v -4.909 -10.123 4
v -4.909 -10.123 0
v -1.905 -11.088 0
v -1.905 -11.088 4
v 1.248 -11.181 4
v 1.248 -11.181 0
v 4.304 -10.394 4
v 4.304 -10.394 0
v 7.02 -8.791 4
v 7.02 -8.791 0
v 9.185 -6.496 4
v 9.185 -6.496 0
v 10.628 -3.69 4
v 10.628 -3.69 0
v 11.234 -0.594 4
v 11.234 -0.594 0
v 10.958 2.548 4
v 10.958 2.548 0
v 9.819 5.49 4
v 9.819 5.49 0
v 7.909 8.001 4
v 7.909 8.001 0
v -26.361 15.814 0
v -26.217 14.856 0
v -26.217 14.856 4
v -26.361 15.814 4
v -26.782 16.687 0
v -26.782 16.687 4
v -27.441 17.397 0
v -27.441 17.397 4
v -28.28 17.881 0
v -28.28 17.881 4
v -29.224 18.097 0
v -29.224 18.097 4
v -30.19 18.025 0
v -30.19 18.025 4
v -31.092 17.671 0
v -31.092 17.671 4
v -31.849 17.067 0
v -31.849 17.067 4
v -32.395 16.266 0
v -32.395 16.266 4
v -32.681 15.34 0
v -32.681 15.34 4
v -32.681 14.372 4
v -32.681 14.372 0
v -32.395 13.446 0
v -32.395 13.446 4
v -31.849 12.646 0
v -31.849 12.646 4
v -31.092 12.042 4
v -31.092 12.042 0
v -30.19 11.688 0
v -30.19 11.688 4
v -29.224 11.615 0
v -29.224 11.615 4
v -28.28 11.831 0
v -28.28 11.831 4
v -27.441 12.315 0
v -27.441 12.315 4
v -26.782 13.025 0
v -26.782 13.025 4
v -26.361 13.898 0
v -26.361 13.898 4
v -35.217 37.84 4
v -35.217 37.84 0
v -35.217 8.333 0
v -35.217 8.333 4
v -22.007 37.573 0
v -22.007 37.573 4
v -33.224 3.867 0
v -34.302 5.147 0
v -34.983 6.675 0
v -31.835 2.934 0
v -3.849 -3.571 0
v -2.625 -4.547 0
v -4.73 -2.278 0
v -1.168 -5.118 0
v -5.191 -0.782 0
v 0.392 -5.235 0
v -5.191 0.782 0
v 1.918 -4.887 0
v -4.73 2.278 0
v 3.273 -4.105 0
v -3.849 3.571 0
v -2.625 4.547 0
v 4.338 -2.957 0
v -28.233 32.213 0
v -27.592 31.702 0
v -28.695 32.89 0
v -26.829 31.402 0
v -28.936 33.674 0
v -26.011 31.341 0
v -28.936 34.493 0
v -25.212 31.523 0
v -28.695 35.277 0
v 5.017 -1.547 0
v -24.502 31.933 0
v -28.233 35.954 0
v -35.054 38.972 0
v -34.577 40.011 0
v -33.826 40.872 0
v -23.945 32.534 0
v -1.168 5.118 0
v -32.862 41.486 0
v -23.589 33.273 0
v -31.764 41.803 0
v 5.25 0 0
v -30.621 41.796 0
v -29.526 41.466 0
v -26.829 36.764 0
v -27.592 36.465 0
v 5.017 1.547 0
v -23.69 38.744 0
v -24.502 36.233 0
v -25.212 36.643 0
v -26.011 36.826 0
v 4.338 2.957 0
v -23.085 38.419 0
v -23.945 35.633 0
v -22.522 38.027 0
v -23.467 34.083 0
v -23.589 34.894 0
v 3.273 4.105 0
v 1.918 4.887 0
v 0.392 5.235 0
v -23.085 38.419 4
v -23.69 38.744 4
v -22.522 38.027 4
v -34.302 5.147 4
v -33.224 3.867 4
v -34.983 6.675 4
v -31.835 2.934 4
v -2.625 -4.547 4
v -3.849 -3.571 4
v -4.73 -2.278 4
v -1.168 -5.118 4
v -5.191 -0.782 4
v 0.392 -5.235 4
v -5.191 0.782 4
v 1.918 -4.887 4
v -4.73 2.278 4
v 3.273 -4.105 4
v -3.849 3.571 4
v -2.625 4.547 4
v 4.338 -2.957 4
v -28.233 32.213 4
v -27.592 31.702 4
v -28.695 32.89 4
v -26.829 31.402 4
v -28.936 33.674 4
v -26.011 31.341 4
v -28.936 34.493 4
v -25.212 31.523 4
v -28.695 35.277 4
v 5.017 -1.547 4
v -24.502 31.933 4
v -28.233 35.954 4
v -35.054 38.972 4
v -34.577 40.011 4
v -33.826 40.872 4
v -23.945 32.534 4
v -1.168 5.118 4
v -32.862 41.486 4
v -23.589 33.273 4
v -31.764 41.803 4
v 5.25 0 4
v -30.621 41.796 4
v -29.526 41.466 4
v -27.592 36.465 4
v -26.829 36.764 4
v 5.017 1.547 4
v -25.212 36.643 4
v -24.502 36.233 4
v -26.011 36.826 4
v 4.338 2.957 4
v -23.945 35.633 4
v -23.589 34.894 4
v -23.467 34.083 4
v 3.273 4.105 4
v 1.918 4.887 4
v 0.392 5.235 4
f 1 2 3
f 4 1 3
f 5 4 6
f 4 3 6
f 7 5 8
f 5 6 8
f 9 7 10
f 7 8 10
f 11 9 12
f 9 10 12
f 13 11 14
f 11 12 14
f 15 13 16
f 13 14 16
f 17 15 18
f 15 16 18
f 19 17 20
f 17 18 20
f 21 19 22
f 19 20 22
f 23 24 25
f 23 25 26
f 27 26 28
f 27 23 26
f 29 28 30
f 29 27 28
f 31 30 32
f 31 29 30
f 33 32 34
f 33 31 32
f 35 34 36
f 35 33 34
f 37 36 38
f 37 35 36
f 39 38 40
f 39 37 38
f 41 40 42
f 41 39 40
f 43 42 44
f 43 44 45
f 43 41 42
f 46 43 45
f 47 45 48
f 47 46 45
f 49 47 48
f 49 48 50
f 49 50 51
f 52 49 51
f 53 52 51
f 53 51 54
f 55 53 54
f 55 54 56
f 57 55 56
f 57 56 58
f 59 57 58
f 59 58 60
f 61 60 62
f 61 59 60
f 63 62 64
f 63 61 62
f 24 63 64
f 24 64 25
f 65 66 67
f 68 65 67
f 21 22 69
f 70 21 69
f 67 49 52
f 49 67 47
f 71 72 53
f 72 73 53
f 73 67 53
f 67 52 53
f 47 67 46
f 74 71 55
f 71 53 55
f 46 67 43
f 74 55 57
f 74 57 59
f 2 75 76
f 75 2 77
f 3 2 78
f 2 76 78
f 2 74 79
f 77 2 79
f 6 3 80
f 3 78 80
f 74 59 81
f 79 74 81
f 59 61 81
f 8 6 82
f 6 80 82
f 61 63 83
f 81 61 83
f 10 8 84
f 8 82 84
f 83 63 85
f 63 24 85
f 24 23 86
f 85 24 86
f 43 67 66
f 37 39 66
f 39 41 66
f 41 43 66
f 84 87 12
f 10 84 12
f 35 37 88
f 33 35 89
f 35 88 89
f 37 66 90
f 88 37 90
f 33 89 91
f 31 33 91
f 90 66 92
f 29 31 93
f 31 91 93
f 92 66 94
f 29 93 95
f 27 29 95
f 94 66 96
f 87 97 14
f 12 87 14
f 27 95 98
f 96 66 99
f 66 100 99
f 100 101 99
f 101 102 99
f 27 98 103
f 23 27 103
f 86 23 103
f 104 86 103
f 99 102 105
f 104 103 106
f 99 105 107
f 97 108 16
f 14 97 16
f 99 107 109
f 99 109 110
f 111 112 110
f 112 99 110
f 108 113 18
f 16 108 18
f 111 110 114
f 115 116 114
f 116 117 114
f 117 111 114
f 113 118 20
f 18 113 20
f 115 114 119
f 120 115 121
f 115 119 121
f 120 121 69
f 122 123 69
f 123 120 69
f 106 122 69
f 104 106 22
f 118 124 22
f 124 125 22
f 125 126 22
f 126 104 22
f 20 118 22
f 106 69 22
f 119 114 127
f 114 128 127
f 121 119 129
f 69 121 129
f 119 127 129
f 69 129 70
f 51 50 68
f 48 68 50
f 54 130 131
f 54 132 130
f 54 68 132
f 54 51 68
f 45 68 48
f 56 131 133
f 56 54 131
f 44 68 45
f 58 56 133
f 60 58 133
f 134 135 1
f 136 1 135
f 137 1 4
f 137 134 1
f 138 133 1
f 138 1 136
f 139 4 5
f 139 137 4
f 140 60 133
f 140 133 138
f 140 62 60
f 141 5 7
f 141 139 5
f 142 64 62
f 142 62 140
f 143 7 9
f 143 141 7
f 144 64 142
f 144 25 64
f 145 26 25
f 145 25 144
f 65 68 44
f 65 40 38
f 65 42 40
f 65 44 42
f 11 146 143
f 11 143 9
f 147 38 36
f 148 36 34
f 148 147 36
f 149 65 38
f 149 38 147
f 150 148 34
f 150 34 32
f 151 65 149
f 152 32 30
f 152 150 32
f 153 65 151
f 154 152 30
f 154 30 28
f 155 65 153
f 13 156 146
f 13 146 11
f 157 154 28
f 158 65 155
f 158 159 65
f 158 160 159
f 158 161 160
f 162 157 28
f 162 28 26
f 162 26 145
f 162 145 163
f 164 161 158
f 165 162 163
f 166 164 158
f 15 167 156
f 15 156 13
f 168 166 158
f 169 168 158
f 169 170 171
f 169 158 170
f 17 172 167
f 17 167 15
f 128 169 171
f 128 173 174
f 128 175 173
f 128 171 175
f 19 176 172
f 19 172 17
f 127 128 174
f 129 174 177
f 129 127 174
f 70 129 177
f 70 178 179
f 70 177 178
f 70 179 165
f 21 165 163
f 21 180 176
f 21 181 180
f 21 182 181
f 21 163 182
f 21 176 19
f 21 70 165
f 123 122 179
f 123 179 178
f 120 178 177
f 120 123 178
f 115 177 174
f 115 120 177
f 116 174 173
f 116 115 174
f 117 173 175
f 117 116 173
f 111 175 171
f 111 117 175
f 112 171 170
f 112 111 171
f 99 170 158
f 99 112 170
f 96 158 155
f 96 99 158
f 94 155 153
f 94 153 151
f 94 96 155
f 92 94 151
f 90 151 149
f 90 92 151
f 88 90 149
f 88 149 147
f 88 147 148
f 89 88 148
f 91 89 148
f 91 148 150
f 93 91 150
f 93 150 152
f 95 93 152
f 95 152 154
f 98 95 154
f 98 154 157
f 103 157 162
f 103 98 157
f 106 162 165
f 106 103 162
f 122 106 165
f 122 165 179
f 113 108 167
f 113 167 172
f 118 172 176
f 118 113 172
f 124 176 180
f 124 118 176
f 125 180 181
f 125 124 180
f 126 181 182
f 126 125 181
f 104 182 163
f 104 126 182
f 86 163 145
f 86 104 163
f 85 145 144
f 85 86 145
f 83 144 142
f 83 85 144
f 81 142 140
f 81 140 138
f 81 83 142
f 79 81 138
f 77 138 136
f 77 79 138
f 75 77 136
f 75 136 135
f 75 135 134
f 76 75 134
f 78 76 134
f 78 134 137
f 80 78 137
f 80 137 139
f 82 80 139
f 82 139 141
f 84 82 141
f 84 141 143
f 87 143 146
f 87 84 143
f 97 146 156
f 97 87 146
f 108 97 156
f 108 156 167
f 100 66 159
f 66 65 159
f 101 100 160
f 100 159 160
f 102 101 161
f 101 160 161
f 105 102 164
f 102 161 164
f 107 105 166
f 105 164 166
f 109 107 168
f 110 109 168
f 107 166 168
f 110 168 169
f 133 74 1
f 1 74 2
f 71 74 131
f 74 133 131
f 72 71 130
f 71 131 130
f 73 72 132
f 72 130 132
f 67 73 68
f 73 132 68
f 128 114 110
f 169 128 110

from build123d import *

# Parameters (mm, degrees)
F0_R     = 3.25
F0_R_2   = 5.25
F0_R_3   = 2.75
F1_DEPTH = 4
F2_R     = 6
F3_R     = 4


with BuildPart() as f1:
    # F0 (on Top) → F1 (new body)
    with BuildSketch(Plane.XY):
        with BuildLine():
            Line((-35.216862, 4.573831), (-4.908502, -10.122703))
            ThreePointArc((-4.908502, -10.122703), (9.185091, -6.495891), (7.908829, 8.000807))
            Line((7.908829, 8.000807), (-22.747156, 38.304369))
            Line((-22.747156, 38.304369), (-35.216862, 44.119088))
            Line((-35.216862, 44.119088), (-35.216862, 4.573831))
        make_face()
        with Locations((-29.466862, 14.856111)):
            Circle(F0_R, mode=Mode.SUBTRACT)
        Circle(F0_R_2, mode=Mode.SUBTRACT)
        with Locations((-26.216862, 34.08337)):
            Circle(F0_R_3, mode=Mode.SUBTRACT)
    extrude(amount=F1_DEPTH)

    # F2
    f2_edges = [f1.edges().sort_by_distance(p)[0] for p in [
        (-22.747156, 38.304369, 2),
        (-35.216862, 4.573831, 2),
    ]]
    fillet(f2_edges, radius=F2_R)

    # F3
    f3_edges = [f1.edges().sort_by_distance(p)[0] for p in [
        (-35.216862, 44.119088, 2),
    ]]
    fillet(f3_edges, radius=F3_R)


solid = f1.part
